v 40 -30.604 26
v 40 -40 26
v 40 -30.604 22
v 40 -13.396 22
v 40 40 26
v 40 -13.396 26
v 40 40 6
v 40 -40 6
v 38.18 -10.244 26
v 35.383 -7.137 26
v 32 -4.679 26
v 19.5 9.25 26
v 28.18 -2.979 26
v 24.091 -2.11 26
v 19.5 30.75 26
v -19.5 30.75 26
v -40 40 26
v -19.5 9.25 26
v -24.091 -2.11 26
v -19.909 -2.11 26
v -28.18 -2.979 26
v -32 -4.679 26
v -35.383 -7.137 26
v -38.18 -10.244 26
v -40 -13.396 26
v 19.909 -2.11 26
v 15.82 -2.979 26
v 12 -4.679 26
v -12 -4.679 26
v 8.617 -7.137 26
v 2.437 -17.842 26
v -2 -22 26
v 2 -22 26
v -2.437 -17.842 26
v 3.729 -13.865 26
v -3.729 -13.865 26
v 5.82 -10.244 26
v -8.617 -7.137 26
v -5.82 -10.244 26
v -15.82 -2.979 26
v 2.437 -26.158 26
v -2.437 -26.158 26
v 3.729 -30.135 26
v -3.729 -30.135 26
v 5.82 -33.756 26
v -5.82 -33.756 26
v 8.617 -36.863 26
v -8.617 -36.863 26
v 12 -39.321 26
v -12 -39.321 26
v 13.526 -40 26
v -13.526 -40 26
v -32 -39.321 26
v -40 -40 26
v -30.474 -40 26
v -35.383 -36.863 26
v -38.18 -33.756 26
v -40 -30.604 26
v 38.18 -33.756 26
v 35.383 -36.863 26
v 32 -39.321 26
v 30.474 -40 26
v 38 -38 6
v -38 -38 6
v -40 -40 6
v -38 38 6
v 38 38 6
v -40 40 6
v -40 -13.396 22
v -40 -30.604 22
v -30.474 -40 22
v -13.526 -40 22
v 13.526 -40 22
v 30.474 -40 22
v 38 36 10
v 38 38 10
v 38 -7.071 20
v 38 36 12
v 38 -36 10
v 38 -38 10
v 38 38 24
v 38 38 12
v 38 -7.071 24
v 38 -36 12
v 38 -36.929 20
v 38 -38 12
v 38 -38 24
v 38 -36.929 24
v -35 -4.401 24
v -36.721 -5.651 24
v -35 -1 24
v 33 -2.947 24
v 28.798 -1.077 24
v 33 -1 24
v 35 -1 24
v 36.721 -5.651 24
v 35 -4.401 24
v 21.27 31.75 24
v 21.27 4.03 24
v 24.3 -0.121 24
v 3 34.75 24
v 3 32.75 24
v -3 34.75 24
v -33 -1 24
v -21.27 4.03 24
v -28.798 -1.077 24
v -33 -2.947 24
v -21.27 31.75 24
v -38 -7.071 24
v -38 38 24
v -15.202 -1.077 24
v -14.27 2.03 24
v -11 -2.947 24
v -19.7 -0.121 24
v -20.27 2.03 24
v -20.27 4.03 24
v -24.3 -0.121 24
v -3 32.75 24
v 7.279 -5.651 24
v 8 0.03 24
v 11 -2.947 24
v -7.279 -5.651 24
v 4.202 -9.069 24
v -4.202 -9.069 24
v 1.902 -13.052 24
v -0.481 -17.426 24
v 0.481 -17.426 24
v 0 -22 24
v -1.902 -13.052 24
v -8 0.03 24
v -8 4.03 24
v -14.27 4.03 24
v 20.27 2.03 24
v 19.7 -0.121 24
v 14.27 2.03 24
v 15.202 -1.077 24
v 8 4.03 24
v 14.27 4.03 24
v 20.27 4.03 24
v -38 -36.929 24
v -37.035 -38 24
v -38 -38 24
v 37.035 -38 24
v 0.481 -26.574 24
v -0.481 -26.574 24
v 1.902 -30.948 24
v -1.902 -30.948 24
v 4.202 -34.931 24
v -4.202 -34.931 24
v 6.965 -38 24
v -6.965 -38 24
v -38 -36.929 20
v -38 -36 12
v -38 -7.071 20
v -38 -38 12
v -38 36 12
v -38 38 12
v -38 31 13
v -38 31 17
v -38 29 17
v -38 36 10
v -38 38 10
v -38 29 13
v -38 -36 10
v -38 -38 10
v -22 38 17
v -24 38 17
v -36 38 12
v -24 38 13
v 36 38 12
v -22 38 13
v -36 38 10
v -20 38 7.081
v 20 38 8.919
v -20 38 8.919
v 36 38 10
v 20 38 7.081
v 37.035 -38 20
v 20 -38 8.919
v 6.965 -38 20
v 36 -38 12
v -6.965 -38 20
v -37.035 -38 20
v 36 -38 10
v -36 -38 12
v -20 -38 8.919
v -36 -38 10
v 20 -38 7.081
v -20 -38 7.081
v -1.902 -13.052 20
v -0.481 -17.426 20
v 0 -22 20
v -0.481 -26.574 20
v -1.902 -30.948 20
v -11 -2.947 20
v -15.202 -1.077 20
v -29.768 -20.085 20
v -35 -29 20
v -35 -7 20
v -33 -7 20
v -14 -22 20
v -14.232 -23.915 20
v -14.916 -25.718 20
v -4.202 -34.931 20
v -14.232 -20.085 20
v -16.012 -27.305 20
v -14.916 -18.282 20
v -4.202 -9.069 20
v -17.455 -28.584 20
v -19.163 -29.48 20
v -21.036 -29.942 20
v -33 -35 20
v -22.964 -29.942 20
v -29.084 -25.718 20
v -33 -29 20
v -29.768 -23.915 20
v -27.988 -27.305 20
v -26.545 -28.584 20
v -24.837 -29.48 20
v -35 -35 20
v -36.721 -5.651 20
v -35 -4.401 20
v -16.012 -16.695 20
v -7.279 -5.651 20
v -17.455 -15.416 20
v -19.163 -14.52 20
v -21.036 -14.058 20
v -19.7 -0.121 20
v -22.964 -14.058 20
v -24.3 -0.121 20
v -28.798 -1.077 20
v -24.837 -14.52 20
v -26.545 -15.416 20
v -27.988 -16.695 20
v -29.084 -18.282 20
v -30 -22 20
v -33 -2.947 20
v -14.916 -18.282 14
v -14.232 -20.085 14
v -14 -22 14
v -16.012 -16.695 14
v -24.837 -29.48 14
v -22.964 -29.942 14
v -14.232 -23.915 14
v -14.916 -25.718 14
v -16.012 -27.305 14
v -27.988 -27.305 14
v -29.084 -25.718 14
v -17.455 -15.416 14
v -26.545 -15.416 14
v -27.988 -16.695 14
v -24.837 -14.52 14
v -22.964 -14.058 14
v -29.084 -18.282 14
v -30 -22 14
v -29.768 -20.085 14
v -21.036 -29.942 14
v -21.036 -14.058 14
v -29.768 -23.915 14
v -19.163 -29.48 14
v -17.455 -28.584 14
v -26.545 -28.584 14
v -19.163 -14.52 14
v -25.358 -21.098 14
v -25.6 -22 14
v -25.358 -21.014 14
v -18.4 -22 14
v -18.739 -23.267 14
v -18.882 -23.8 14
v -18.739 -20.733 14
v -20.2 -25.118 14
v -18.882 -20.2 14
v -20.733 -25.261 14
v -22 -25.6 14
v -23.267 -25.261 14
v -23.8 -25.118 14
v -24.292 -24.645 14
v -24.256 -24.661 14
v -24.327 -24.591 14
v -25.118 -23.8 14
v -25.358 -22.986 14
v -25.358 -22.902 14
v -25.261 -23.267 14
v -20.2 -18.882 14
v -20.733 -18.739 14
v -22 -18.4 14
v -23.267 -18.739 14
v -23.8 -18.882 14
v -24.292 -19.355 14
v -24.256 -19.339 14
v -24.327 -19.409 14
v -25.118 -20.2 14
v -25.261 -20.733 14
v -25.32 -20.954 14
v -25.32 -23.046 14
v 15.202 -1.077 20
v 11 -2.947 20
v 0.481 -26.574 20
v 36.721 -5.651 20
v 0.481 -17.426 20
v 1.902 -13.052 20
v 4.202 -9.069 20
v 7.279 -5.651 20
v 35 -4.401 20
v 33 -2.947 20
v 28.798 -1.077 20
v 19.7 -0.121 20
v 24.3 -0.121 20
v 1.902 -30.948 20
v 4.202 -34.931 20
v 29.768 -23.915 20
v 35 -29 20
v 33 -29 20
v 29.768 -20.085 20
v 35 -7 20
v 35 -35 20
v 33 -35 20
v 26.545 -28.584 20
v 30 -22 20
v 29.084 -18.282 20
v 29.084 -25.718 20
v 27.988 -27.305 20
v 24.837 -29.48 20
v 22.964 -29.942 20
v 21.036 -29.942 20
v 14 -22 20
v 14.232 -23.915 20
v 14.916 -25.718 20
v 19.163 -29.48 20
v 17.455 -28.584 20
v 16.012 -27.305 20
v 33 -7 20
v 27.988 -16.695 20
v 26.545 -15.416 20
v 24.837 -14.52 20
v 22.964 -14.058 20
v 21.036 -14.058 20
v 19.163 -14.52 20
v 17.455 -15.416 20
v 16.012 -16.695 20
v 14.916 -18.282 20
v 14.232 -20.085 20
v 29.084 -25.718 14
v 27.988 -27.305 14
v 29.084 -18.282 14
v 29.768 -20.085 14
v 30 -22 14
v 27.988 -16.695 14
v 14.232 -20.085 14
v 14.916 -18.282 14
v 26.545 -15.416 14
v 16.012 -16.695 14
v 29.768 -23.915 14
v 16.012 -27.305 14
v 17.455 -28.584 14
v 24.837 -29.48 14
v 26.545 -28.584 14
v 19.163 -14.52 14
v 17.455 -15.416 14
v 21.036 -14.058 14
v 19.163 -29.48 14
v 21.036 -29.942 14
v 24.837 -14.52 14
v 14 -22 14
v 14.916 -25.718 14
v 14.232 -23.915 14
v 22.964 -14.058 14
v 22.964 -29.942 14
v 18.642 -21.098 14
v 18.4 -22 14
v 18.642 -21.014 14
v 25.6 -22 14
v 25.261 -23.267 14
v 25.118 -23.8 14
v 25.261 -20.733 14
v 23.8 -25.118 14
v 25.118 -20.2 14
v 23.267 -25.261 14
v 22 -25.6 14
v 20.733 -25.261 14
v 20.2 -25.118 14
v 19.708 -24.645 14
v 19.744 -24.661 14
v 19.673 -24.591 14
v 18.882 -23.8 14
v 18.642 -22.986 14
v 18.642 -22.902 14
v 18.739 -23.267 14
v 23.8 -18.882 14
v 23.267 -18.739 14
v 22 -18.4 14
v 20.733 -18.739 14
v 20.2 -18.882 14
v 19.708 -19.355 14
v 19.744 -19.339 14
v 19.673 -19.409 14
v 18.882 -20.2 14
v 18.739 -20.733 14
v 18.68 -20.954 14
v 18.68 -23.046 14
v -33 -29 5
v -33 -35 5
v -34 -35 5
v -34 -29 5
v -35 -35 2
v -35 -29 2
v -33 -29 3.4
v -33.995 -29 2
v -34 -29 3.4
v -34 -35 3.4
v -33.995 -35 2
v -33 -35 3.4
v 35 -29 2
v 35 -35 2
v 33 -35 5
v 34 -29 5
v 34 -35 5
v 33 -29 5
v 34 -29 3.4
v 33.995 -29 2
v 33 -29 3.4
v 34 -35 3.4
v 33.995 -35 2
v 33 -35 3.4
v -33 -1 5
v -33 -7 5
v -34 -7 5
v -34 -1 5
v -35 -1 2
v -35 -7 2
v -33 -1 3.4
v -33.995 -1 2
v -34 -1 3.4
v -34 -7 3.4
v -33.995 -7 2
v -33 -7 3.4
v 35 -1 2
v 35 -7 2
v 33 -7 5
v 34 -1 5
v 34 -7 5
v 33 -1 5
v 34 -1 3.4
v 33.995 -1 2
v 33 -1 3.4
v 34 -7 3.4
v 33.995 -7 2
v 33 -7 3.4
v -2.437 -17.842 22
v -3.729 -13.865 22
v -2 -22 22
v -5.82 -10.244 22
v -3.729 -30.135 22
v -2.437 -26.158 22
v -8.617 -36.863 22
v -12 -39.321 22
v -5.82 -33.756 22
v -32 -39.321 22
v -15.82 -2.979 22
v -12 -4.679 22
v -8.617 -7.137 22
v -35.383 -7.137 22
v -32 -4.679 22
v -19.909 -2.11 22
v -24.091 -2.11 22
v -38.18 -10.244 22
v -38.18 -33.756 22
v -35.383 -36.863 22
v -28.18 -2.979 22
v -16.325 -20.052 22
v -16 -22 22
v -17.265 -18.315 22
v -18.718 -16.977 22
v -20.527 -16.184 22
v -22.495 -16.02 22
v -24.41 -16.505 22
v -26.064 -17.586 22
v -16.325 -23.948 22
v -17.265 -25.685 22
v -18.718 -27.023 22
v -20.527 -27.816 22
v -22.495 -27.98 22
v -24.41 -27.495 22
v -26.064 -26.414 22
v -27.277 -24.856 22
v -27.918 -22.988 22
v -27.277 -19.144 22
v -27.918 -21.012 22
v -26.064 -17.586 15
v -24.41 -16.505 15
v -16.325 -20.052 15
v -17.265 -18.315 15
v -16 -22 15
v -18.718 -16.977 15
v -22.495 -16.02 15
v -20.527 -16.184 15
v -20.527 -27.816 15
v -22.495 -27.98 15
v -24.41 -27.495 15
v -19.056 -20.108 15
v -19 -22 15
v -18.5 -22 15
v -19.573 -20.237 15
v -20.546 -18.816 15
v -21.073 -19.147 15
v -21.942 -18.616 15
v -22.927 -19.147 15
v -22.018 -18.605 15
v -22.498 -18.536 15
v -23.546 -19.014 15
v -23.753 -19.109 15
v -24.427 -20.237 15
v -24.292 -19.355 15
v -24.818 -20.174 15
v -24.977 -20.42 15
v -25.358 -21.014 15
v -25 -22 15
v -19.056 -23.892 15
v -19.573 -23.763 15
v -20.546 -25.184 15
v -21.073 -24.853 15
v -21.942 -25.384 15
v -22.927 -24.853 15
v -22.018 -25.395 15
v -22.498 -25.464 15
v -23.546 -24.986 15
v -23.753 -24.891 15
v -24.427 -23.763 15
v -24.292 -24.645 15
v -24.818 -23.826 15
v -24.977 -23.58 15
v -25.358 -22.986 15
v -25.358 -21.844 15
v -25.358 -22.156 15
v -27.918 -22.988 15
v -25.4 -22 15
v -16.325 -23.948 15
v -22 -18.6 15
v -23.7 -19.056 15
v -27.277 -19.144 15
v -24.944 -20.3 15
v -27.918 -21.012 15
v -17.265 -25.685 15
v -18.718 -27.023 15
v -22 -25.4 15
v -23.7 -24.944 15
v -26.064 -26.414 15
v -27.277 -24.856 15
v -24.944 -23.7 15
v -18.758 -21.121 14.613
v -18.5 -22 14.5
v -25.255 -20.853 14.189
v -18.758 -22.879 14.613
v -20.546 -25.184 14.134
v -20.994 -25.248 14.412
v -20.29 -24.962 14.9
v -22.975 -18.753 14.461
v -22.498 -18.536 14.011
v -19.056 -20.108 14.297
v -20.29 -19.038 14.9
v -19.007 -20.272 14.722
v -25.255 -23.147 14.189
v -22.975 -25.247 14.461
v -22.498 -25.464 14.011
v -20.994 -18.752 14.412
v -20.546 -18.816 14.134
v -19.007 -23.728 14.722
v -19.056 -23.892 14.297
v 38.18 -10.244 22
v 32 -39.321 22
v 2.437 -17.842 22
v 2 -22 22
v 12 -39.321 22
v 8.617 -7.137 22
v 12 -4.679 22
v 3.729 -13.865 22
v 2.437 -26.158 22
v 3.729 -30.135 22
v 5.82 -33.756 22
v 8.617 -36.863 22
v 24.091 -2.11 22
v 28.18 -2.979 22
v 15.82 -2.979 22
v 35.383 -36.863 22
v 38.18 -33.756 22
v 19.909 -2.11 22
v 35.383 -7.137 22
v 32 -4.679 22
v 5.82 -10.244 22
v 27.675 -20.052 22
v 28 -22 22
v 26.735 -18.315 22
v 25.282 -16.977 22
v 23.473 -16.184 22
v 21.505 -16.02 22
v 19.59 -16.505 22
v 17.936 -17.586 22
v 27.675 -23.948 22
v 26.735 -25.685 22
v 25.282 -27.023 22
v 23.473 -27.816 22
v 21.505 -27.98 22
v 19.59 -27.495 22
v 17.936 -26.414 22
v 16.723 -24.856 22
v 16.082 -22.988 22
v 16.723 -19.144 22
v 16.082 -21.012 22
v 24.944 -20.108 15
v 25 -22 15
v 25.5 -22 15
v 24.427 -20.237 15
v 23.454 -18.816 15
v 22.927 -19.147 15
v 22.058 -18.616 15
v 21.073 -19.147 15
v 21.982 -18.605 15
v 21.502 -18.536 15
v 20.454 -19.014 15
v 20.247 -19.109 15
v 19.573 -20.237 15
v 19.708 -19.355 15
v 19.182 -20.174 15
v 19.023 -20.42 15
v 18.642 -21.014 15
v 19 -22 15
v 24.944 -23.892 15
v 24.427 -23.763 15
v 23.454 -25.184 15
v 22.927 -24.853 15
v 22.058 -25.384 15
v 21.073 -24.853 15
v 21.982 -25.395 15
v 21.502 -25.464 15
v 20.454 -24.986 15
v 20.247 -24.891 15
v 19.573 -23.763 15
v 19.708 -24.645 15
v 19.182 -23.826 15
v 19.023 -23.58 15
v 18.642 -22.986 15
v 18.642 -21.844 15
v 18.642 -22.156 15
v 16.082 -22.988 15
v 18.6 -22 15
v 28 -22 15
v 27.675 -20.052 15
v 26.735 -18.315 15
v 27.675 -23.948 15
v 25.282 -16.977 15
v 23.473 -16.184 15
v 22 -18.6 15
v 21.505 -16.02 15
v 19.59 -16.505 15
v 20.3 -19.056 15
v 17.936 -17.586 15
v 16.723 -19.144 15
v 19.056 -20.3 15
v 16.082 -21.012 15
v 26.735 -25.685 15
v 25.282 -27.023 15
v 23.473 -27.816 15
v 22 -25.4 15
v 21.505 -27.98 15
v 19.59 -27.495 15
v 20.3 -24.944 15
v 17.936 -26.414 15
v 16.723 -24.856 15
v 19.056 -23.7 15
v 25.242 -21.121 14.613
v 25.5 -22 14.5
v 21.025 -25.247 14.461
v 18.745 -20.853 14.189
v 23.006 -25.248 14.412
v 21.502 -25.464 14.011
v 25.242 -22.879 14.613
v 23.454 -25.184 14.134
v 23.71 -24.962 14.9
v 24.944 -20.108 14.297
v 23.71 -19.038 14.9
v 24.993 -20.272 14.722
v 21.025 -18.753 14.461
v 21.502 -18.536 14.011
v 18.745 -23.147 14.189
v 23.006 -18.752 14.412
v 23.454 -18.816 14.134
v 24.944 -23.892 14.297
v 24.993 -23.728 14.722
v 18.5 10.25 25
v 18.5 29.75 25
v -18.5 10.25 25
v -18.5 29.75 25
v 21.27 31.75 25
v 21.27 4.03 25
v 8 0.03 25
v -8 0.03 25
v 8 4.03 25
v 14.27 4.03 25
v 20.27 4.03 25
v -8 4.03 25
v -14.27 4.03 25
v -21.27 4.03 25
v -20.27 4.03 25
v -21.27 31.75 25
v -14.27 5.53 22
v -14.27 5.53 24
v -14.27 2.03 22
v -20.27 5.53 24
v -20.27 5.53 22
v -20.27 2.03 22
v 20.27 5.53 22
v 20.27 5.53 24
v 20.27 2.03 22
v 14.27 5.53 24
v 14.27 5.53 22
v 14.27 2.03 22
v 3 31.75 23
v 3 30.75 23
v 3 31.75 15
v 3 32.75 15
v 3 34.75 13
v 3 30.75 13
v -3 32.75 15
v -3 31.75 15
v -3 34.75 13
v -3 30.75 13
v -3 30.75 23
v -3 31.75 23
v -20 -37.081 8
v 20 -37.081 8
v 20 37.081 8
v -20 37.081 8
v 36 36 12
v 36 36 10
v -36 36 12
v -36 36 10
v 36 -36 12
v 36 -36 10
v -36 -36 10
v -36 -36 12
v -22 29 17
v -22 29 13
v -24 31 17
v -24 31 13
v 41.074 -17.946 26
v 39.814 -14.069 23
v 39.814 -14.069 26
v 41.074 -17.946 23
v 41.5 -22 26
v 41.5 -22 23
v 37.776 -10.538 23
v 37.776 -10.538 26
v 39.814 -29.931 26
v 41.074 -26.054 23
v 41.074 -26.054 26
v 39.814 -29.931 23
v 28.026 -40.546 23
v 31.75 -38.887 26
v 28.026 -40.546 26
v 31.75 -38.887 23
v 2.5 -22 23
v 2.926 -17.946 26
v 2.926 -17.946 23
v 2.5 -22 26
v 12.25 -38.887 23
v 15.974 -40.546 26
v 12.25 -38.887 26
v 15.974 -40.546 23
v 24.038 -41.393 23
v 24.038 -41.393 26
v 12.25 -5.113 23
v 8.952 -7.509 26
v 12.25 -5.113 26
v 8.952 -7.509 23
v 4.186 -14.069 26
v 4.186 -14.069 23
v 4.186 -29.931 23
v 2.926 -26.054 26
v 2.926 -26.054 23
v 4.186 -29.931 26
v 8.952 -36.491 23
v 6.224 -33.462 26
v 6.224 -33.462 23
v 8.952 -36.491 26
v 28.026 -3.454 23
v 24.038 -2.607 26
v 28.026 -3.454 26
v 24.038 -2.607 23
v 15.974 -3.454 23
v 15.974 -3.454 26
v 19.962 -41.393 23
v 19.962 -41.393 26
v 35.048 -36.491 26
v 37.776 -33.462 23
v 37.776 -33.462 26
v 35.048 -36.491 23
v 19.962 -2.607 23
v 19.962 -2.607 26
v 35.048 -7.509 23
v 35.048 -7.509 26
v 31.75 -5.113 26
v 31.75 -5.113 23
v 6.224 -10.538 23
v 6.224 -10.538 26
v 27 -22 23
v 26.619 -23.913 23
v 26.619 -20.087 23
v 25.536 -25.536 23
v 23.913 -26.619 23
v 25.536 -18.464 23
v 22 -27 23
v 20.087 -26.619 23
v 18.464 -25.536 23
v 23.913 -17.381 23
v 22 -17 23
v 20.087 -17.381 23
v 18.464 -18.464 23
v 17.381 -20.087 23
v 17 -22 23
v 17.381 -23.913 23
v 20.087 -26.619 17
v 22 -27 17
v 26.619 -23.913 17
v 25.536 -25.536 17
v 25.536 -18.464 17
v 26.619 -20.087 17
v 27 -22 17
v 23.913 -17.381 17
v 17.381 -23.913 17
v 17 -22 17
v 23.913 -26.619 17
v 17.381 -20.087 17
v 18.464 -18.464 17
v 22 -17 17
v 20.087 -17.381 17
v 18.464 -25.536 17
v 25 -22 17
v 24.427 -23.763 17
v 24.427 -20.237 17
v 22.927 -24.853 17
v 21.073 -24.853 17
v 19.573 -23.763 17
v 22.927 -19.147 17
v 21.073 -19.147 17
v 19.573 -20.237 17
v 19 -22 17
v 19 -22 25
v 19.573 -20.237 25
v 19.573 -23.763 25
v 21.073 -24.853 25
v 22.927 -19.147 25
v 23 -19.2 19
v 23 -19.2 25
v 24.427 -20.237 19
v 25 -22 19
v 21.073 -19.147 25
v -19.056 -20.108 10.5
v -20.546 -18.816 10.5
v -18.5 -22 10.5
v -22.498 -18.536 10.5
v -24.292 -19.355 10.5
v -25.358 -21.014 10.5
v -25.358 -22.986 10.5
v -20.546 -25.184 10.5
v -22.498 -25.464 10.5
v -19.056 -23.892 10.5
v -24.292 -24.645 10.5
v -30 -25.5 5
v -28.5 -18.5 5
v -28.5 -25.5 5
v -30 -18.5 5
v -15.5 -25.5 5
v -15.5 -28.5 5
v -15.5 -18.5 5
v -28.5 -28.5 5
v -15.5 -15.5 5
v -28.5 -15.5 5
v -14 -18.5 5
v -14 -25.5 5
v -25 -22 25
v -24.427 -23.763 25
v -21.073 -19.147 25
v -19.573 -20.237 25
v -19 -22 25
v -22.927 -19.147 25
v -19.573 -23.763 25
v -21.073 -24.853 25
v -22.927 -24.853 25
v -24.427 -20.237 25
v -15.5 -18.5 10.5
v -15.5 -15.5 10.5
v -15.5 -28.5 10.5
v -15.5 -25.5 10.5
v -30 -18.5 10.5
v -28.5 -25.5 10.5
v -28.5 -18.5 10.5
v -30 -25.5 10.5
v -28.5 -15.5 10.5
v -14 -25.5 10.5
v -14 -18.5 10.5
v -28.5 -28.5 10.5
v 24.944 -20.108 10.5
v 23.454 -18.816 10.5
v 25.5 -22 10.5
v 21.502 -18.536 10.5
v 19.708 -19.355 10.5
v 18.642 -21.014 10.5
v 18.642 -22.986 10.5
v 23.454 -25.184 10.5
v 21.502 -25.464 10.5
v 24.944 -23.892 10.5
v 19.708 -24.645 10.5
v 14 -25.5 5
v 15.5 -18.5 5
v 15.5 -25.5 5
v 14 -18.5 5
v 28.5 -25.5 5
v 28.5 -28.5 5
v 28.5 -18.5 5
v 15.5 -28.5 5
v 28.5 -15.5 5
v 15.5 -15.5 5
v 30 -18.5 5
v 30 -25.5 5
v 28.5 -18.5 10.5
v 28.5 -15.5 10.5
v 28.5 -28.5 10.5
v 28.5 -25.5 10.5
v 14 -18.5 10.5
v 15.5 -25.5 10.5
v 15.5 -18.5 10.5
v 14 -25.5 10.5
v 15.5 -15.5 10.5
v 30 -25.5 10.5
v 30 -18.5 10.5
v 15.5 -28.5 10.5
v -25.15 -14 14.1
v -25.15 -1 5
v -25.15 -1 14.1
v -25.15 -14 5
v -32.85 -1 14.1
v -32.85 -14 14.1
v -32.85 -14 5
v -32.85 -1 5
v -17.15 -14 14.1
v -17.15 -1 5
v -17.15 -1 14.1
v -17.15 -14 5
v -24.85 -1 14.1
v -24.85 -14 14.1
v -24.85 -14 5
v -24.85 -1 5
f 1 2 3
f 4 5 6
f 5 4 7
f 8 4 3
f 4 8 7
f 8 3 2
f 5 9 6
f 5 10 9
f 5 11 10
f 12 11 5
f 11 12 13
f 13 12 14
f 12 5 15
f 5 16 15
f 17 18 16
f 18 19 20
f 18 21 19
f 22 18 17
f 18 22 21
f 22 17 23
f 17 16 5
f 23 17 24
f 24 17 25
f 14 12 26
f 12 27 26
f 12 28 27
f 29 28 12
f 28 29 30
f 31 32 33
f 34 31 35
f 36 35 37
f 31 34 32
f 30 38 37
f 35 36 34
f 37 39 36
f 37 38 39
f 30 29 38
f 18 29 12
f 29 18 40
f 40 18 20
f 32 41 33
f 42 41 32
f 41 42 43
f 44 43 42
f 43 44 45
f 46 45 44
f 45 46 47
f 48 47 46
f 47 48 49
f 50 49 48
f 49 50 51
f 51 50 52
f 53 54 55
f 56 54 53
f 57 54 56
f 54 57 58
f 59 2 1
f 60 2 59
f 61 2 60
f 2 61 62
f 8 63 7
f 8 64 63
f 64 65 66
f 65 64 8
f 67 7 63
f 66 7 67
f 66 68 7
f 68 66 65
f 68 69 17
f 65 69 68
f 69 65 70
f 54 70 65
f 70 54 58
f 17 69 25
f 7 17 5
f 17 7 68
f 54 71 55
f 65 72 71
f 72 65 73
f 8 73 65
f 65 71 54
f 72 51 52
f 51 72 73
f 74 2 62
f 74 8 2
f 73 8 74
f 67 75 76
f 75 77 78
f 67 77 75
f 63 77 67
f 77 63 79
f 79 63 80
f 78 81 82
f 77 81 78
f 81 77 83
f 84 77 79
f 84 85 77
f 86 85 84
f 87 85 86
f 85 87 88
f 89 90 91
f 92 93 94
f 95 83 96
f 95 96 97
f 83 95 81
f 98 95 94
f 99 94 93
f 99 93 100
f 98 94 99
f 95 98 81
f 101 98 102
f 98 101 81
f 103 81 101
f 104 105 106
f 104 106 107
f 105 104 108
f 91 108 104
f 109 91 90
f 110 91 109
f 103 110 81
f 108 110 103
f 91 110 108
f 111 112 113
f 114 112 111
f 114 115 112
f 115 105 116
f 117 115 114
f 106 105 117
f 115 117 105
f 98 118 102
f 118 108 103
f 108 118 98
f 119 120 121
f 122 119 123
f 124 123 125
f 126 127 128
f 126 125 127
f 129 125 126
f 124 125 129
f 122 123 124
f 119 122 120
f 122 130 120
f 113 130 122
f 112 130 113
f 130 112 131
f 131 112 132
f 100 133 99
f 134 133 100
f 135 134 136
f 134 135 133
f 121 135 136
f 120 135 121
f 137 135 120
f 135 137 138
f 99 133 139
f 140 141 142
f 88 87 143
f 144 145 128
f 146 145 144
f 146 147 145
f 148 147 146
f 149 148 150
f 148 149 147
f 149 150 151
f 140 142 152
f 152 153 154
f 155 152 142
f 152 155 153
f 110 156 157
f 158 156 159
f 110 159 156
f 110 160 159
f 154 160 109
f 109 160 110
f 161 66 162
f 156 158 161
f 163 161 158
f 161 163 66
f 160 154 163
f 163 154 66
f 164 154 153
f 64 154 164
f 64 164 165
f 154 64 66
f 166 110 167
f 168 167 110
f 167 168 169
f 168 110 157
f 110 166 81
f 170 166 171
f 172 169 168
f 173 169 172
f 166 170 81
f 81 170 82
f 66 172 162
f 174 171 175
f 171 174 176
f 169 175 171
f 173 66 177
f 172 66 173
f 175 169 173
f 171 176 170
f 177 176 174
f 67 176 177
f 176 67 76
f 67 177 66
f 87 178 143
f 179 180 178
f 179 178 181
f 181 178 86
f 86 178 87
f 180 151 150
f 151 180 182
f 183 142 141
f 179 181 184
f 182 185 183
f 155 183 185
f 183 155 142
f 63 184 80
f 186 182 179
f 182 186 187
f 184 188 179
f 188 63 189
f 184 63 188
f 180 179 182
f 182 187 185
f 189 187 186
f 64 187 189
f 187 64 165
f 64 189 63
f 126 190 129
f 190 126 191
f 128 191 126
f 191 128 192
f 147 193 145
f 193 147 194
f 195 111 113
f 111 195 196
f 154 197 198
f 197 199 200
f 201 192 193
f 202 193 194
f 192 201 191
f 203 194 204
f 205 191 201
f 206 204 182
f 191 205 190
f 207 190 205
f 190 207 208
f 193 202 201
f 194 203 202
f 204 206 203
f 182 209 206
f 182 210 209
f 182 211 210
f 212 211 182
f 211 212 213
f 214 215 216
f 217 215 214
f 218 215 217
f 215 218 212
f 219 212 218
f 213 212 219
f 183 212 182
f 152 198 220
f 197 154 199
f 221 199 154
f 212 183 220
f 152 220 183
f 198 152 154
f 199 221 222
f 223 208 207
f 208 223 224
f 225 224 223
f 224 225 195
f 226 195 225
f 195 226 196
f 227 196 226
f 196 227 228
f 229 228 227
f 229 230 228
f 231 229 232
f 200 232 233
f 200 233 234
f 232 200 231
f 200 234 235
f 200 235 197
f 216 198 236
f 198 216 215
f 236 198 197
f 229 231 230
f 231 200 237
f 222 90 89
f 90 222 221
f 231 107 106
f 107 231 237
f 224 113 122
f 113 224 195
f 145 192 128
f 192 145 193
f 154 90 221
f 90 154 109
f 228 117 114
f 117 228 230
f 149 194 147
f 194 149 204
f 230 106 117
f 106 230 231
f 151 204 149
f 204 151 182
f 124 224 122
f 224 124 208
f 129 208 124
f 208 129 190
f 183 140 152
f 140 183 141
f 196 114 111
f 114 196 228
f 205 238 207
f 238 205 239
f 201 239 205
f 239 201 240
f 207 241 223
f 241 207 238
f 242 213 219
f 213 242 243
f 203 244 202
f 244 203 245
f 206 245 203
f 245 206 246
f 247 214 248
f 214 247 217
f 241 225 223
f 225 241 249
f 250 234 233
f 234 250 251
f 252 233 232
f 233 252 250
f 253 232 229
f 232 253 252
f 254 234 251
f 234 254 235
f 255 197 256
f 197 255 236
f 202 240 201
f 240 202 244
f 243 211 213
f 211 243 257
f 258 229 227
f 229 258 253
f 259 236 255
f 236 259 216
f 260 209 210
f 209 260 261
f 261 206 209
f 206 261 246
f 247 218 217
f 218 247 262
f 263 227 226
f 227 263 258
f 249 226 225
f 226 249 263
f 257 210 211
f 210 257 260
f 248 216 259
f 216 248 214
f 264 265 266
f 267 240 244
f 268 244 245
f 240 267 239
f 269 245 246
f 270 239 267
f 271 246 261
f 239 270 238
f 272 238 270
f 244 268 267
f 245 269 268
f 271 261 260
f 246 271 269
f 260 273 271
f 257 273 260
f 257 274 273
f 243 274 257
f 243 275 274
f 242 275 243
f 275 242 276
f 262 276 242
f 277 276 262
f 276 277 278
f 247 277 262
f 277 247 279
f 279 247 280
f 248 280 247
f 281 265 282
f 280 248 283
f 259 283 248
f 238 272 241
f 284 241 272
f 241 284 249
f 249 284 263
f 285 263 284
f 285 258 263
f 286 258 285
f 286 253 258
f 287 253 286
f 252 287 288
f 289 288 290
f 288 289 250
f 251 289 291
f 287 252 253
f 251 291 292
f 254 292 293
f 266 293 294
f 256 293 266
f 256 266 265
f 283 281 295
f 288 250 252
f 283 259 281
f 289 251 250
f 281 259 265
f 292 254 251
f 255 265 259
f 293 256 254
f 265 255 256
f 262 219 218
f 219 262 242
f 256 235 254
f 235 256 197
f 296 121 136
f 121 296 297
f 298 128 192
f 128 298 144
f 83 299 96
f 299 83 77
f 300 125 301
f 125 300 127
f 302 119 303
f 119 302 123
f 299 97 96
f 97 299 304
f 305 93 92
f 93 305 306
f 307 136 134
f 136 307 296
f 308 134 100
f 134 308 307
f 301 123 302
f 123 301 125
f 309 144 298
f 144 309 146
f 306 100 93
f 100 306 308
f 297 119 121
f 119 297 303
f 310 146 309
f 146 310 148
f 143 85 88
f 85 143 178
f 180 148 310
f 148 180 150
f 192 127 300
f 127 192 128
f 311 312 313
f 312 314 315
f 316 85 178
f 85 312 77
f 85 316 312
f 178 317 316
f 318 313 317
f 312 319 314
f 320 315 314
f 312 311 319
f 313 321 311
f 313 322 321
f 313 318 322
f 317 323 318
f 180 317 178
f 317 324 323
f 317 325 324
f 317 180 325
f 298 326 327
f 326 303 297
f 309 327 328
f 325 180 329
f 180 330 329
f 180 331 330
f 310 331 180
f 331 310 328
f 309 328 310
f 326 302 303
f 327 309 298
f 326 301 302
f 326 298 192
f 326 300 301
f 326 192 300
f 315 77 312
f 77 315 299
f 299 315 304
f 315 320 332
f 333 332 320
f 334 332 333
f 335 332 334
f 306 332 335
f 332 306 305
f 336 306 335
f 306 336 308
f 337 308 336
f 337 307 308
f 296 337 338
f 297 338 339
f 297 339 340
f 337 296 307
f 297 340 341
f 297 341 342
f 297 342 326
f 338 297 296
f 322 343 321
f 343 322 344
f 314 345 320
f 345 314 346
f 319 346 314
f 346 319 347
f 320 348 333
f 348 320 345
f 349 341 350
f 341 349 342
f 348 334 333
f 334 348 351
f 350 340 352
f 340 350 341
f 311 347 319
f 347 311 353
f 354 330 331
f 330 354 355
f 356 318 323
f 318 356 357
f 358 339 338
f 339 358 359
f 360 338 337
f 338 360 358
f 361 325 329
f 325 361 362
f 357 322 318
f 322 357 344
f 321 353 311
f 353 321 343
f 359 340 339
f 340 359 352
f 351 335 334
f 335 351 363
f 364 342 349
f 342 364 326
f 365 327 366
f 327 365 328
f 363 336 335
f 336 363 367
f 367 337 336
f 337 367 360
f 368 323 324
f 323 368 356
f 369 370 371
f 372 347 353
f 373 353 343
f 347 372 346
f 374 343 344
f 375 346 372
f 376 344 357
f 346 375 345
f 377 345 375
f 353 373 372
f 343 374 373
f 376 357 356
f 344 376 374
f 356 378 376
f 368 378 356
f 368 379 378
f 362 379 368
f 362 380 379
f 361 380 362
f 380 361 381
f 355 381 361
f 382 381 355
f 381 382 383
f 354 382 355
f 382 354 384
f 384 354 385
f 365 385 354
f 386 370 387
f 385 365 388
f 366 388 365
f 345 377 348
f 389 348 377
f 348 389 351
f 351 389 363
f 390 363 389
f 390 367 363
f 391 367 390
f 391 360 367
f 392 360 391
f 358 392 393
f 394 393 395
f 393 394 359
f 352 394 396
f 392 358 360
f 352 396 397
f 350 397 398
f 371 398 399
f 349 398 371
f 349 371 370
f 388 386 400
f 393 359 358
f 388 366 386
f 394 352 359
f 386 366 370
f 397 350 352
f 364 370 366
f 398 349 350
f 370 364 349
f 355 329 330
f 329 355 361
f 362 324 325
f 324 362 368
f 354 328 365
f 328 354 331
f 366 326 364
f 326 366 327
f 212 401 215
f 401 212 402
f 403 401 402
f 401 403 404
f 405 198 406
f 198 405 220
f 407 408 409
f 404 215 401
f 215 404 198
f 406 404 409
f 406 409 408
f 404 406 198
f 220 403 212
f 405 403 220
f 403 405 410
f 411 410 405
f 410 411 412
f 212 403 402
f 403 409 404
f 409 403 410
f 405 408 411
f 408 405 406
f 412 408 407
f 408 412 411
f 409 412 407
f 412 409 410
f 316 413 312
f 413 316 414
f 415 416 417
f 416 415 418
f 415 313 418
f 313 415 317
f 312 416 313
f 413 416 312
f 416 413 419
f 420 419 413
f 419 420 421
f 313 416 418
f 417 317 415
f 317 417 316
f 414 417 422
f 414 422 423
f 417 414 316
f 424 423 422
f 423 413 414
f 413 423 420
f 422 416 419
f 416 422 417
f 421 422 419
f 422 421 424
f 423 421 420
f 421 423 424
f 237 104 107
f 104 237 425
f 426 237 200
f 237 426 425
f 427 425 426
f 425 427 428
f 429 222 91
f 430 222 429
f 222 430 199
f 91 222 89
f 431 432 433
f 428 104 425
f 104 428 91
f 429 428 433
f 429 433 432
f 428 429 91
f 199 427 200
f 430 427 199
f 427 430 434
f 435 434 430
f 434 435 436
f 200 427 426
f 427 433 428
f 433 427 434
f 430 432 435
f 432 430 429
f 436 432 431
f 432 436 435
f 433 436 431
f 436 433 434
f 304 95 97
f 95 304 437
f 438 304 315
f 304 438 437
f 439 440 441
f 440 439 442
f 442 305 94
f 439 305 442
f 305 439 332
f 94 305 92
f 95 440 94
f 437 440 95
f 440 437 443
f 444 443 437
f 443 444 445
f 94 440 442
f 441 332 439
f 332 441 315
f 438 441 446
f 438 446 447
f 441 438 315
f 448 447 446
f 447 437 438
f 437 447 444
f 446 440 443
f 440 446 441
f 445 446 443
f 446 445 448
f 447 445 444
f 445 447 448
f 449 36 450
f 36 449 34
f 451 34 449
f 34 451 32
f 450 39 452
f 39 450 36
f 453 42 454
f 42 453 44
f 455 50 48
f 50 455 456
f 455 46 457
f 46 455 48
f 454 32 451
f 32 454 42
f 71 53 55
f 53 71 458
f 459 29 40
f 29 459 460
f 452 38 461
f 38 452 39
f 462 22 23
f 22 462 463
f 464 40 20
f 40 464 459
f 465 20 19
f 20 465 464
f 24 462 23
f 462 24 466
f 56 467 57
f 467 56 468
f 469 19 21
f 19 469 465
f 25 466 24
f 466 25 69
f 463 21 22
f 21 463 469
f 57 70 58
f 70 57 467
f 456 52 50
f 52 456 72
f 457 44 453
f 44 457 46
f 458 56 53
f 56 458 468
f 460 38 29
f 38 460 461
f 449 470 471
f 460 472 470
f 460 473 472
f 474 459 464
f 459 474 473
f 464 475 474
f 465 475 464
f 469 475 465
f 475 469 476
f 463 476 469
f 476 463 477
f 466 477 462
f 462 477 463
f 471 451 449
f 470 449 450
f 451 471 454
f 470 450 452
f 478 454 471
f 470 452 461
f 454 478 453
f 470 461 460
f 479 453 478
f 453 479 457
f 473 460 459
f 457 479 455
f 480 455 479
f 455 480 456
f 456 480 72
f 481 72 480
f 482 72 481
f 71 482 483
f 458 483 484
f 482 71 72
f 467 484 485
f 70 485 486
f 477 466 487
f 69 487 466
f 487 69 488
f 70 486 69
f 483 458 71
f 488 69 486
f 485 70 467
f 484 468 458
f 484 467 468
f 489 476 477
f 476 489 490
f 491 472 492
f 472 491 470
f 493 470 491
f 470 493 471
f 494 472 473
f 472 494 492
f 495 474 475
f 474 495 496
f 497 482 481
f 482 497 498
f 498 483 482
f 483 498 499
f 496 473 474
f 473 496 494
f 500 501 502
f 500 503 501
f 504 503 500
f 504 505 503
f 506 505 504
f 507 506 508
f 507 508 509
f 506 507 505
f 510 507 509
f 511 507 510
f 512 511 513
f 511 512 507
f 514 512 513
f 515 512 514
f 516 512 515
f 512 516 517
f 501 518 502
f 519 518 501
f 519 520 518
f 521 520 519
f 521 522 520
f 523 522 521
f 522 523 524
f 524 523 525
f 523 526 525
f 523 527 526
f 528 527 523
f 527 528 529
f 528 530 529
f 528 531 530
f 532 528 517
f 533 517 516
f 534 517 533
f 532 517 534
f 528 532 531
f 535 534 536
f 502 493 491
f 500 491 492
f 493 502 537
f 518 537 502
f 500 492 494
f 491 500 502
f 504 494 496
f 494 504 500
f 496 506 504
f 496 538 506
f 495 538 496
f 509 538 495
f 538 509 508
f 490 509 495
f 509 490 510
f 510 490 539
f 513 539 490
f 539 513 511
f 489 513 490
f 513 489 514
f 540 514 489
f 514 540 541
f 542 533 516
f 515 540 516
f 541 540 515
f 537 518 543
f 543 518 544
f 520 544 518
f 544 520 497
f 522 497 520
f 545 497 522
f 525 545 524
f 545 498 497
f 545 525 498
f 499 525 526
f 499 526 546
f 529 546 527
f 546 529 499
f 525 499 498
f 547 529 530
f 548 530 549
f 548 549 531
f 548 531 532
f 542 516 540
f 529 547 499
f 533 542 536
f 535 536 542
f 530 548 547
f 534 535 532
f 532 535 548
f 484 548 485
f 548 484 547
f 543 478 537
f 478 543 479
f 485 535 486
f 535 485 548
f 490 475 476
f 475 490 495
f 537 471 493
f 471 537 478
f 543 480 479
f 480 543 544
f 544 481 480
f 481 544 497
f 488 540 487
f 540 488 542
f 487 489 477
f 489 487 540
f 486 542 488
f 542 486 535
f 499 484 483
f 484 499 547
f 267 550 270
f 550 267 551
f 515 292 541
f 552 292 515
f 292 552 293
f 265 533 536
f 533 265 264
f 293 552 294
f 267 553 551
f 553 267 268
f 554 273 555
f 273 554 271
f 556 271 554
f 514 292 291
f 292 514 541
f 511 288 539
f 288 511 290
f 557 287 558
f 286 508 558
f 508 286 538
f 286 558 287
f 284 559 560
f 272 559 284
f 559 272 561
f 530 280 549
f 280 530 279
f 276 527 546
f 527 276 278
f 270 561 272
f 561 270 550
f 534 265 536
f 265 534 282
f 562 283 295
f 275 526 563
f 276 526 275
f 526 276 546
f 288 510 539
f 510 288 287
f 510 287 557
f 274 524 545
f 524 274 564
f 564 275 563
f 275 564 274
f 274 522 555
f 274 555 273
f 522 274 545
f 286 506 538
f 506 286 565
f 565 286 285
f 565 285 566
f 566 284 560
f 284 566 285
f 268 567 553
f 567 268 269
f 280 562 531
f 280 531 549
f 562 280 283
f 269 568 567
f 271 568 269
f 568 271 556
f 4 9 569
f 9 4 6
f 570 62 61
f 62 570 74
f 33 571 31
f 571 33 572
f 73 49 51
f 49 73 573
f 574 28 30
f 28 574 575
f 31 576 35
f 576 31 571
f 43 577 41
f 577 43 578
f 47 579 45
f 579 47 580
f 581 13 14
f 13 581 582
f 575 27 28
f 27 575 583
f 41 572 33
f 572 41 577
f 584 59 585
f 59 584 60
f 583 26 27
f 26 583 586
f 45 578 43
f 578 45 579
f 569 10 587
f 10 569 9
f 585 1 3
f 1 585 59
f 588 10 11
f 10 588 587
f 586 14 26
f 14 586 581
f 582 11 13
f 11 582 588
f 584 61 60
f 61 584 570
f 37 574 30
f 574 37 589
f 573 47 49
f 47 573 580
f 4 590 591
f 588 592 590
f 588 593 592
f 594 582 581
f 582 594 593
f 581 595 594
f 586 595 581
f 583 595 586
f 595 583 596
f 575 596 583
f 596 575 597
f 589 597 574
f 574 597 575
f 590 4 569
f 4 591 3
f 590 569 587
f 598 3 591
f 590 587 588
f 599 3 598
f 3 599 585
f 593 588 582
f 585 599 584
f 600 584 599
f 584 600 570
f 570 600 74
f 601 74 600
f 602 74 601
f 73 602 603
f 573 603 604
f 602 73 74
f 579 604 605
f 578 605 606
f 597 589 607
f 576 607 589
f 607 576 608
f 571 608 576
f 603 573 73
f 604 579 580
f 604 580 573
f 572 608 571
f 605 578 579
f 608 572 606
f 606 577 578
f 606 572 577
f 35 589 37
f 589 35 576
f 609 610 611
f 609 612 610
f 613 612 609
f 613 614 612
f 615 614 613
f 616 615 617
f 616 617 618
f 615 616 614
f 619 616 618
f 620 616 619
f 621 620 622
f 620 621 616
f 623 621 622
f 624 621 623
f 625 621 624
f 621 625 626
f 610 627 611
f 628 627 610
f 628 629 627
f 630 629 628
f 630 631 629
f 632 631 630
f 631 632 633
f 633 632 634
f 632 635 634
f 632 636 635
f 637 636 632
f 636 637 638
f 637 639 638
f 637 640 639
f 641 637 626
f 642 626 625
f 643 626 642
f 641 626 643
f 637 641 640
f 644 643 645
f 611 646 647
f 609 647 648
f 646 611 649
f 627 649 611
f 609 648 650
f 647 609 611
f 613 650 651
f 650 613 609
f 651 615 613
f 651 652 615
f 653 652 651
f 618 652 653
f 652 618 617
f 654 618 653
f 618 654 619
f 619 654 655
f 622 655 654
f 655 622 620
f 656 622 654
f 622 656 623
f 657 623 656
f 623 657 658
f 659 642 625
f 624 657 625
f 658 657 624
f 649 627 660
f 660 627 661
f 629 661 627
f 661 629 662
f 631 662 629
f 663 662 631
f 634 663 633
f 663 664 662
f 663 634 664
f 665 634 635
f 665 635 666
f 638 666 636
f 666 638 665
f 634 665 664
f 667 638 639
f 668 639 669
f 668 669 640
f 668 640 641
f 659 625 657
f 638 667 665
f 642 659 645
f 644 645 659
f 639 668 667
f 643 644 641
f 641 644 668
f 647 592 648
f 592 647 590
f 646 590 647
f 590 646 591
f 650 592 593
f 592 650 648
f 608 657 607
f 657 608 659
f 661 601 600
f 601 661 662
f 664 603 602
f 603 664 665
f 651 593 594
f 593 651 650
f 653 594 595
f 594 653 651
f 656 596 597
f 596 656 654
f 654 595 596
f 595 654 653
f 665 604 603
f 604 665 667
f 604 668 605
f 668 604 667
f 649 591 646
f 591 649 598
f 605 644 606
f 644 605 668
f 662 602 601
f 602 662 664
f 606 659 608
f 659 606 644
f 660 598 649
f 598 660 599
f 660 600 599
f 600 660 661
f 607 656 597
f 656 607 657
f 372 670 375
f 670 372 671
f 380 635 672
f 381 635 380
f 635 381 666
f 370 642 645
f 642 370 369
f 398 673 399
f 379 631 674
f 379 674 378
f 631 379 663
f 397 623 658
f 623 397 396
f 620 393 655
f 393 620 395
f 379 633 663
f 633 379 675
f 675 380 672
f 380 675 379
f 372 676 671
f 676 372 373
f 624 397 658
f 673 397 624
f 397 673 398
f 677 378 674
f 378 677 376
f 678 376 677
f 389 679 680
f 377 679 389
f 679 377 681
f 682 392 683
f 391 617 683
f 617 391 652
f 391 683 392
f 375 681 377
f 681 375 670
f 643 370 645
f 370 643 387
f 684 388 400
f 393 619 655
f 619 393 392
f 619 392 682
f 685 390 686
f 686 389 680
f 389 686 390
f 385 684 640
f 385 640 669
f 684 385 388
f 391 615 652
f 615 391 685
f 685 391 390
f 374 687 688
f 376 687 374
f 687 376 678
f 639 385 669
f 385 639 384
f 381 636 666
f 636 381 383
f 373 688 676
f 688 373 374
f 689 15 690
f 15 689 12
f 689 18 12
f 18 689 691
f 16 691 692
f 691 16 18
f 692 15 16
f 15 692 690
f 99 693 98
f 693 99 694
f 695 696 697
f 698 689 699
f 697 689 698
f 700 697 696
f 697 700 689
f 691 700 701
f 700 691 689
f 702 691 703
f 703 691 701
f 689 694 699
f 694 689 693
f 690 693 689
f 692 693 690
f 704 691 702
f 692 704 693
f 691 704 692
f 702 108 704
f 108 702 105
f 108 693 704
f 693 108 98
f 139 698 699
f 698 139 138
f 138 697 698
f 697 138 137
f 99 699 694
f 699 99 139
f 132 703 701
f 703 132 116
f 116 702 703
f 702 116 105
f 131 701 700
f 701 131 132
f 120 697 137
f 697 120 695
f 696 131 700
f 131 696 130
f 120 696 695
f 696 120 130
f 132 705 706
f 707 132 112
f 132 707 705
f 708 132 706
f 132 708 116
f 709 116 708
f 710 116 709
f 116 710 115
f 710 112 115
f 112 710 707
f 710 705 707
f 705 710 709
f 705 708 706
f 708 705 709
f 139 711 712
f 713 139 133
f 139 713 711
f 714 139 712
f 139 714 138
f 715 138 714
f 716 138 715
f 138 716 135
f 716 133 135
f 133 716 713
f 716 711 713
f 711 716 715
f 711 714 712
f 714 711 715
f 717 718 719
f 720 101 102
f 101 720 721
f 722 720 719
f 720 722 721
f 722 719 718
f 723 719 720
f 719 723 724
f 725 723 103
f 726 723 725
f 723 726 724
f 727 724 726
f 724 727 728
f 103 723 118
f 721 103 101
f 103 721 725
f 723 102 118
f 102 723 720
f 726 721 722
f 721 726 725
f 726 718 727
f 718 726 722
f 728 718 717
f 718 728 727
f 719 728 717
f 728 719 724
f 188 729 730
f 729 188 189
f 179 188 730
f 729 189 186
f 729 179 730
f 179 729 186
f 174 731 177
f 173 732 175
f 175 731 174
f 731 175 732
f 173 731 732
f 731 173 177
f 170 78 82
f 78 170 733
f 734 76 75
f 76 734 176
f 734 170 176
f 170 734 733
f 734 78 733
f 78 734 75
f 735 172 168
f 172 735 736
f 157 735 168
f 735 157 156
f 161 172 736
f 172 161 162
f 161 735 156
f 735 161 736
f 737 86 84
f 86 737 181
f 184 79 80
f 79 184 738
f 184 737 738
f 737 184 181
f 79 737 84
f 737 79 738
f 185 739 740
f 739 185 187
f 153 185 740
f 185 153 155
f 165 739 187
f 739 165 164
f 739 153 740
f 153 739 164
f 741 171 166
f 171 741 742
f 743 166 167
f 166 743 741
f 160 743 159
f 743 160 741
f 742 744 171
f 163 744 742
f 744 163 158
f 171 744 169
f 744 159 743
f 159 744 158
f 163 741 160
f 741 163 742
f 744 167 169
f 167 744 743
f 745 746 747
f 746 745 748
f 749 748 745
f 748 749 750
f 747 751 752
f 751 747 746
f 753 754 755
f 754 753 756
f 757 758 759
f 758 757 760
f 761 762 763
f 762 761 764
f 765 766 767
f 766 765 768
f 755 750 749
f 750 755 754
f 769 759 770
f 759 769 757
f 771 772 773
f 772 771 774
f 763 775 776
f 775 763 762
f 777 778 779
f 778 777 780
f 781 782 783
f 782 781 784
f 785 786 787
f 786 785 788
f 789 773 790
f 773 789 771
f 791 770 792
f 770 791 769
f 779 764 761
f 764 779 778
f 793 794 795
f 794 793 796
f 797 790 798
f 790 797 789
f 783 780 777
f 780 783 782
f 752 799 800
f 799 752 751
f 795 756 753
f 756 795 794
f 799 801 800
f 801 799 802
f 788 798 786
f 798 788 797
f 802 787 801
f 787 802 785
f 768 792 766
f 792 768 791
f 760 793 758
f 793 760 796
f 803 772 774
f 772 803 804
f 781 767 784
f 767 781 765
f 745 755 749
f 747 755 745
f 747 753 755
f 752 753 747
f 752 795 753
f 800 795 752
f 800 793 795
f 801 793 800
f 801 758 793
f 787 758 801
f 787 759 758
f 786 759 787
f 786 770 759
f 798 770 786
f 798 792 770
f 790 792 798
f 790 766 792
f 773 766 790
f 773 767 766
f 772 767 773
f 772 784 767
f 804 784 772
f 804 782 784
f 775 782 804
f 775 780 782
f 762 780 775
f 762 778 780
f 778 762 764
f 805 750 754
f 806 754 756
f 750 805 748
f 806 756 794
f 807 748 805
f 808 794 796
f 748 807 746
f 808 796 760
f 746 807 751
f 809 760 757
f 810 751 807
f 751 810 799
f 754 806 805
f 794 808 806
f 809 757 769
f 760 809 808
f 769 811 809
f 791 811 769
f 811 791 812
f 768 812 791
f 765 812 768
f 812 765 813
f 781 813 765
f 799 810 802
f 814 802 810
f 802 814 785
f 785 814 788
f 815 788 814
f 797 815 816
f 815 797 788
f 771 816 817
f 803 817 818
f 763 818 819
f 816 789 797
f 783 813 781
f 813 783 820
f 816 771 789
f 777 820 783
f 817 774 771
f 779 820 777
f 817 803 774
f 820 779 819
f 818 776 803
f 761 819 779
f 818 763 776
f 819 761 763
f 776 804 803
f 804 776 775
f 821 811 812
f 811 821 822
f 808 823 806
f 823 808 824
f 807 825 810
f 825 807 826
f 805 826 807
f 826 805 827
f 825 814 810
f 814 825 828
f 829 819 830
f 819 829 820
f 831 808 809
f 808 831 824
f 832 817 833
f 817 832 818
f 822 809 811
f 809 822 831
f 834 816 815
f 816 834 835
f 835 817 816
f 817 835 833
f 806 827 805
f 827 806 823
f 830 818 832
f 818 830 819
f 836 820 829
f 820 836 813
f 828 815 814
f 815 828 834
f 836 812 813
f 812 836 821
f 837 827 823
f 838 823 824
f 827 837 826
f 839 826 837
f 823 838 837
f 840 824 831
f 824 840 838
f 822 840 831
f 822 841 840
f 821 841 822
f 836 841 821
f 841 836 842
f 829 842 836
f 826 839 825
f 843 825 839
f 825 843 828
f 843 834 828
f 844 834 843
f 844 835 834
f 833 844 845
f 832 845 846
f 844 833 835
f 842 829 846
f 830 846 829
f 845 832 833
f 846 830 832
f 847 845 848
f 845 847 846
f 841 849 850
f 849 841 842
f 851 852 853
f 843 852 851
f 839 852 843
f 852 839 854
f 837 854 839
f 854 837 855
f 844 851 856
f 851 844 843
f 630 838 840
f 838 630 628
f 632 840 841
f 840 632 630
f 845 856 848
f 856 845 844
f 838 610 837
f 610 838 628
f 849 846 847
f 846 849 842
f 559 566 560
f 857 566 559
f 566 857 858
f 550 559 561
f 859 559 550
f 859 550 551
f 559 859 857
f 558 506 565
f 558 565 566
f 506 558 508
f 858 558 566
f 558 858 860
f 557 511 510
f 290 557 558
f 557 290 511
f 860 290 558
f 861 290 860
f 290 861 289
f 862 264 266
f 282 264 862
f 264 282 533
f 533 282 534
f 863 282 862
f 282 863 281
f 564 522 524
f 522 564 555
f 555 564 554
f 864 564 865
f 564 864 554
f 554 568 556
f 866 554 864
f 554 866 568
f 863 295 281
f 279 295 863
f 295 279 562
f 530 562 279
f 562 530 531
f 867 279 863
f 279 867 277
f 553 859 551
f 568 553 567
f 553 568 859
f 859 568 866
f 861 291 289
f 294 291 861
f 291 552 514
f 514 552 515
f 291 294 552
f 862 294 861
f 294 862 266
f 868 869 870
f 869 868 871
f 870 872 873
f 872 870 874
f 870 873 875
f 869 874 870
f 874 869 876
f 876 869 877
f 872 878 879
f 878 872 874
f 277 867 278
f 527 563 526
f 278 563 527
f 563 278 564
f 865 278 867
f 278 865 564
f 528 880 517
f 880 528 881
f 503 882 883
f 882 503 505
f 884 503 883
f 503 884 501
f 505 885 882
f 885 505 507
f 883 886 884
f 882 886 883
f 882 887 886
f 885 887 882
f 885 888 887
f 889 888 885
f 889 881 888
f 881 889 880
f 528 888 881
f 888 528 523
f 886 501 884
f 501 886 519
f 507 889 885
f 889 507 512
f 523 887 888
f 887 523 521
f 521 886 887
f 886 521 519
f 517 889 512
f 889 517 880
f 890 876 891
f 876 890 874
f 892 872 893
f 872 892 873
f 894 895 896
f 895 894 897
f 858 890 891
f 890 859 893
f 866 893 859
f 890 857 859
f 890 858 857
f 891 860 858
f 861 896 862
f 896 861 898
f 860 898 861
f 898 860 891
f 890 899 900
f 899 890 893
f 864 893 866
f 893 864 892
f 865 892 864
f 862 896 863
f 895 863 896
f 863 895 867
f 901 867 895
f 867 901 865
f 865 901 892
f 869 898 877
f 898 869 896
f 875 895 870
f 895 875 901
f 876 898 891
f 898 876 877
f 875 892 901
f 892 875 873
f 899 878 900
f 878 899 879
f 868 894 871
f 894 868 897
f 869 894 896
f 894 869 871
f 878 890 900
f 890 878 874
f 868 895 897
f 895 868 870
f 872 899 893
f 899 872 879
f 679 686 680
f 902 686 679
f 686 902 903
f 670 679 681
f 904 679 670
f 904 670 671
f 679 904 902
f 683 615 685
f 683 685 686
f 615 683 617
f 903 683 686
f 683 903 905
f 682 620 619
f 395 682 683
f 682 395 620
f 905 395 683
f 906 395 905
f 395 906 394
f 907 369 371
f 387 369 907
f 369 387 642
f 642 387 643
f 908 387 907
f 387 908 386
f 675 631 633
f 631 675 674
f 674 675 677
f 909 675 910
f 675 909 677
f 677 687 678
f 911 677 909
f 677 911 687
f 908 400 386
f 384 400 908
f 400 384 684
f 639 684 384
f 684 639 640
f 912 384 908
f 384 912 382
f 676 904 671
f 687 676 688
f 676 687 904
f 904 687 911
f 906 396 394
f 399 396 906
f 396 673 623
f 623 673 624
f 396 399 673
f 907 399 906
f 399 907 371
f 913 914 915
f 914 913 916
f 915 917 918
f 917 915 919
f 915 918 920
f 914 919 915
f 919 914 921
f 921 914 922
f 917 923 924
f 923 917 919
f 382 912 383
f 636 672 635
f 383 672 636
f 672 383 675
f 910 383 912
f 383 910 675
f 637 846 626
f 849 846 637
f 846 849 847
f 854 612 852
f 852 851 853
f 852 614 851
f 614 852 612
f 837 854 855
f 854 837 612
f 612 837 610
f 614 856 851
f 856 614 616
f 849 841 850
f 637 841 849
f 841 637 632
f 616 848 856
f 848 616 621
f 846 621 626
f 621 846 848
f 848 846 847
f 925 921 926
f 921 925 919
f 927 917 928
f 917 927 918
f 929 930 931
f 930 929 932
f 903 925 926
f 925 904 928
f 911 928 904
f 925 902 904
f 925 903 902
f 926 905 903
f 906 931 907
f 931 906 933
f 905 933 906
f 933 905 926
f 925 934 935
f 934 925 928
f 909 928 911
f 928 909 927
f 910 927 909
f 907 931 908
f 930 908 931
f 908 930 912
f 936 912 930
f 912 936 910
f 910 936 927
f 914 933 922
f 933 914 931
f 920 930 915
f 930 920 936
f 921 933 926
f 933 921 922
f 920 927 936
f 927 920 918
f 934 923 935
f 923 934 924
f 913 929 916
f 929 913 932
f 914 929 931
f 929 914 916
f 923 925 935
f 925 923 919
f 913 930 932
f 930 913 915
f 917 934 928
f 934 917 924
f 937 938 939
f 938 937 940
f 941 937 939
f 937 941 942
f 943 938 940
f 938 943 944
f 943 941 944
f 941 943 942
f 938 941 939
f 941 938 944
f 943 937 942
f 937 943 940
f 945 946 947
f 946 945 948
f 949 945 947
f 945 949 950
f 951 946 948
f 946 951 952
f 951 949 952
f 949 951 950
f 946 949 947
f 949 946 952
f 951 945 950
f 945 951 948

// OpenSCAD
depth = 26;

coverZ = 6;
coverFit = 0.5;

// pcb
pcbWidth = 68;
pcbHeight = 34;
pcbThickness = 1.6;
pcbX = 0;
pcbY = -35;
pcbZ = depth-1-20;

// mounting positions of pcb
mountWidth = pcbWidth;
mountHeight = pcbHeight-6;
mountX1 = pcbX-mountWidth/2;
mountX2 = pcbX+mountWidth/2;
mountY1 = pcbY+3;
mountY2 = pcbY+3+mountHeight;

// potis
potiX = 22;
potiY = -22;
potiR = 19.5;
potiGap = 0.5;

// display
displayX = 0;
displayY = 20;
panelWidth = 42.04 + 0.5;//34.5 + 0.5;
panelHeight = 27.22 + 0.5;//23 + 0.5;
lowerPanelThickness = 1;
upperPanelThickness = 2;
screenWidth = 37;//30.42;
screenHeight = 19.5;//15.7;
screenOffset = 2; // distance between upper panel border and upper screen border
panelX1 = displayX-panelWidth/2;
panelX2 = displayX+panelWidth/2;
panelY2 = displayY+screenHeight/2+screenOffset; // upper border of panel
panelY1 = panelY2-panelHeight; // lower border of panel

module cuboid(x, y, z, w, h, d) {
	translate([x-w/2, y-h/2, z])
		cube([w, h, d]);
}

module frustum(x, y, z, w1, h1, w2, h2, d) {
	// https://en.wikibooks.org/wiki/OpenSCAD_User_Manual/Primitive_Solids#polyhedron	
	points = [
		// lower square
		[x-w1/2,  y-h1/2, z],  // 0
		[x+w1/2,  y-h1/2, z],  // 1
		[x+w1/2,  y+h1/2, z],  // 2
		[x-w1/2,  y+h1/2, z],  // 3
		// upper square
		[x-w2/2,  y-h2/2, z+d],  // 4
		[x+w2/2,  y-h2/2, z+d],  // 5
		[x+w2/2,  y+h2/2, z+d],  // 6
		[x-w2/2,  y+h2/2, z+d]]; // 7
	faces = [
		[0,1,2,3],  // bottom
		[4,5,1,0],  // front
		[7,6,5,4],  // top
		[5,6,2,1],  // right
		[6,7,3,2],  // back
		[7,4,0,3]]; // left  
	polyhedron(points, faces);
}

module potiWheel(x, y) {
	difference() {
		union() {
			// wheel
			translate([x, y, depth-3])
				cylinder(r=potiR, h=3);
			
			// shaft
			translate([x, y, depth-9])
				cylinder(r=5, h=9);
		}
	
		// hole for poti axis
		difference() {
			translate([x, y, depth-12])
				cylinder(r=3, h=11);
			translate([x+1, y-3, depth-7])
				cube([6, 6, 6]);
		}
	}
}

module potiBase(x, y) {
	// base: 2mm base, 1mm air, 3mm wheel
	translate([x, y, depth-6])
		cylinder(r=potiR+potiGap+2, h=6);

	// axis: 3mm poti axis, 2mm wheel axis, 1mm air, 2mm base
	translate([x, y, depth-12])
		cylinder(r=8, h=12);
}

module potiCutout(x, y) {
	// cutout for wheel
	translate([x, y, depth-4])
		cylinder(r=potiR+potiGap, h=5);	

	// hole for wheel axis: 3mm poti axis, 2mm wheel axis, 1mm air
	translate([x, y, depth-11])
		cylinder(r=6, h=11);
	
	// hole for poti axis: 3mm poti axis, 0.5mm poti metal case
	translate([x, y, depth-13])
		cylinder(r1=3.8, r2=3.2, h=3);
}

module upperDisplayHolder(x, y, length) {
	// pillar
	translate([x-3, y+1, depth-1-length])
		cube([6, 2, length]);
	
	// connection from pillar to "spring" clip
	translate([x-3, y-1, depth-1-length-2])
		cube([6, 4, 2]);

	// "spring" clip
	translate([x-3, y-1, depth-1-length])
		cube([6, 1, length-upperPanelThickness]);
}

module lowerDisplayHolder(x, y) {
	// pillar (not needed if panel is not thicker than its cutout)
	translate([x-3, y-2, depth-1-lowerPanelThickness])
		cube([6, 2, lowerPanelThickness]);
	
	// overhanging clip
	translate([x-3, y-2, depth-1-lowerPanelThickness-2])
		cube([6, 3.5, 2]);
}

/*
module pcbHolder(x, y) {
	// pillar
	difference() {
		cuboid(x=x, y=y, z=pcbZ, w=4, h=6, d=depth-1-pcbZ);

		// hole 2.5mm diameter, 12mm deep
		translate([x, y, pcbX-1])
			cylinder(r=1.25, h=12+1);
	}
}
*/
module pcbHolder(x, y, o) {
	// pillar
	cuboid(x=x, y=y, z=pcbZ, w=2, h=6, d=depth-1-pcbZ);
	
	cuboid(x=x+o*0.5, y=y, z=pcbZ-3, w=1, h=6, d=4);
	
	frustum(x=x, y=y, z=pcbZ-3, w1=0.01, h1=6, w2=2, h2=6,
			d=3-pcbThickness);
}

module longHoleH(r, h, l) {
	translate([-l/2, 0, 0])
		cylinder(r=r, h=h);
	translate([l/2, 0, 0])
		cylinder(r=r, h=h);	
	translate([-l/2, -r, 0])
		cube([l, r*2, h]);	
}

module longHoleV(r, h, l) {
	translate([0, -l/2, 0])
		cylinder(r=r, h=h);
	translate([0, l/2, 0])
		cylinder(r=r, h=h);	
	translate([-r, -l/2, 0])
		cube([r*2, l, h]);	
}

module snap(y, l) {
	translate([-l/2, y, coverZ+2])		
		rotate([0, 90, 0])
			rotate([0, 0, 45])
				cuboid(x=0, y=0, z=0, w=1.3, h=1.3, d=l);	
}

module base() {
color([0, 0, 1]) {
difference() {
	union() {
		difference() {
			// base with slanted walls
			union() {
				cuboid(x=0, y=0, z=0, w=76-coverFit, h=76-coverFit, d=coverZ+3);
				frustum(x=0, y=0, z=coverZ+3, w1=76-coverFit, h1=76-coverFit,
						w2=75, h2=75, d=1);
			}
			cuboid(x=0, y=0, z=2, w=72, h=72, d=coverZ+4);
		
			// snap lock
			snap(-(76)/2, 44);
			snap((76)/2, 44);			
		}
		
		// reinforcement for screw holes
		cuboid(x=0, y=10, z=0, w=74, h=2, d=8);
	}
	
	// cable hole
	translate([0, 5, -1])
		longHoleH(r=4, h=7, l=8);
	
	// screw holes
	translate([-12.5, 5, -1])
		longHoleV(r=2, h=7, l=1);
	translate([12.5, 5, -1])
		longHoleV(r=2, h=7, l=1);
	
	translate([-30, 5, -1])
		longHoleV(r=2, h=7, l=1);
	translate([30, 5, -1])
		longHoleV(r=2, h=7, l=1);
	
	// poti cutouts
	translate([-potiX-9, potiY-9, 1])
		cube([18, 18, 2]);
	translate([potiX-9, potiY-9, 1])
		cube([18, 18, 2]);
		
	// pcb screw cutouts
	translate([mountX1, mountY1, 1])
		cylinder(r=3, h=2);
	translate([mountX2, mountY1, 1])
		cylinder(r=3, h=2);
	translate([mountX1, mountY2, 1])
		cylinder(r=3, h=2);
	translate([mountX2, mountY2, 1])
		cylinder(r=3, h=2);
}

// poti supports
translate([-potiX, potiY, 0])
	cylinder(r=3, h=depth-1-20-pcbThickness);
translate([potiX, potiY, 0])
	cylinder(r=3, h=depth-1-20-pcbThickness);

} // color
}

module cover() {
color([1, 0, 0]) {
intersection() {
	difference() {
		union() {
			// case with 2mm wall thickness
			difference() {
				cuboid(x=0, y=0, z=coverZ, w=80, h=80, d=depth-coverZ);
				cuboid(x=0, y=0, z=coverZ-1, w=76, h=76, d=depth-coverZ-1);
			}
			
			// poti bases
			potiBase(x=-potiX, y=potiY);
			potiBase(x=potiX, y=potiY);
			
			// pcb holders
			pcbHolder(x=mountX1, y=mountY1, o=-1);
			pcbHolder(x=mountX2, y=mountY1, o=1);
			pcbHolder(x=mountX1, y=mountY2, o=-1);
			pcbHolder(x=mountX2, y=mountY2, o=1);
		}
		
		// poti cutouts for wheel and axis
		potiCutout(x=-potiX, y=potiY);
		potiCutout(x=potiX, y=potiY);		

		// screen (activa area) cutout
		frustum(x=displayX, y=displayY, z=depth-3,
				w1=screenWidth-4, h1=screenHeight-4,
				w2=screenWidth+4, h2=screenHeight+4, d=4);

		// panel cutout
		cuboid(x=displayX, y=panelY2-panelHeight/2, z=depth-3,
				w=panelWidth, h=panelHeight, d=2);
		cuboid(x=displayX, y=panelY1, z=depth-3,
				w=16, h=8, d=2);
	}

	// cut away overhanging poti bases
	translate([-40, -40, 0])
		cube([80, 80, depth]);
}

// display holders
lowerDisplayHolder(x=panelX1+4, y=panelY1);
lowerDisplayHolder(x=panelX2-4, y=panelY1);
upperDisplayHolder(x=displayX, y=panelY2, length=10);

// snap lock
snap(-(76)/2, 40);
snap((76)/2, 40);

// blockers
cuboid(x=37.5, y=37.5, z=coverZ+4, w=3, h=3, d=2);
cuboid(x=-37.5, y=37.5, z=coverZ+4, w=3, h=3, d=2);
cuboid(x=37.5, y=-37.5, z=coverZ+4, w=3, h=3, d=2);
cuboid(x=-37.5, y=-37.5, z=coverZ+4, w=3, h=3, d=2);

// cable holder
cuboid(x=-30, y=30, z=depth/2, w=16, h=2, d=4);
cuboid(x=-23, y=34, z=depth/2, w=2, h=10, d=4);

} // color
}

module pcb() {
	color([0, 0.6, 0, 0.3])
	translate([-pcbWidth/2, pcbY, pcbZ-pcbThickness])
		cube([pcbWidth, pcbHeight, pcbThickness]);	
}

module poti(x, y) {
	color([0.5, 0.5, 0.5]) {
		cuboid(x=x, y=y, z=pcbZ, w=13, h=13, d=5.5);
		cuboid(x=x, y=y, z=pcbZ, w=16, h=7, d=5.5);
		translate([x, y, pcbZ]) {
			cylinder(r=3.5, h=10);
			cylinder(r=3, h=20);
		}
	}
}

//base();
cover();
//potiWheel(x=-potiX, y=potiY);
potiWheel(x=potiX, y=potiY);
//pcb();

// poti
poti(-potiX, potiY);
poti(potiX, potiY);

// wago
cuboid(x=-29, y=pcbY+pcbHeight-13/2, z=pcbZ, w=7.7, h=13, d=9.1);
cuboid(x=-21, y=pcbY+pcbHeight-13/2, z=pcbZ, w=7.7, h=13, d=9.1);
